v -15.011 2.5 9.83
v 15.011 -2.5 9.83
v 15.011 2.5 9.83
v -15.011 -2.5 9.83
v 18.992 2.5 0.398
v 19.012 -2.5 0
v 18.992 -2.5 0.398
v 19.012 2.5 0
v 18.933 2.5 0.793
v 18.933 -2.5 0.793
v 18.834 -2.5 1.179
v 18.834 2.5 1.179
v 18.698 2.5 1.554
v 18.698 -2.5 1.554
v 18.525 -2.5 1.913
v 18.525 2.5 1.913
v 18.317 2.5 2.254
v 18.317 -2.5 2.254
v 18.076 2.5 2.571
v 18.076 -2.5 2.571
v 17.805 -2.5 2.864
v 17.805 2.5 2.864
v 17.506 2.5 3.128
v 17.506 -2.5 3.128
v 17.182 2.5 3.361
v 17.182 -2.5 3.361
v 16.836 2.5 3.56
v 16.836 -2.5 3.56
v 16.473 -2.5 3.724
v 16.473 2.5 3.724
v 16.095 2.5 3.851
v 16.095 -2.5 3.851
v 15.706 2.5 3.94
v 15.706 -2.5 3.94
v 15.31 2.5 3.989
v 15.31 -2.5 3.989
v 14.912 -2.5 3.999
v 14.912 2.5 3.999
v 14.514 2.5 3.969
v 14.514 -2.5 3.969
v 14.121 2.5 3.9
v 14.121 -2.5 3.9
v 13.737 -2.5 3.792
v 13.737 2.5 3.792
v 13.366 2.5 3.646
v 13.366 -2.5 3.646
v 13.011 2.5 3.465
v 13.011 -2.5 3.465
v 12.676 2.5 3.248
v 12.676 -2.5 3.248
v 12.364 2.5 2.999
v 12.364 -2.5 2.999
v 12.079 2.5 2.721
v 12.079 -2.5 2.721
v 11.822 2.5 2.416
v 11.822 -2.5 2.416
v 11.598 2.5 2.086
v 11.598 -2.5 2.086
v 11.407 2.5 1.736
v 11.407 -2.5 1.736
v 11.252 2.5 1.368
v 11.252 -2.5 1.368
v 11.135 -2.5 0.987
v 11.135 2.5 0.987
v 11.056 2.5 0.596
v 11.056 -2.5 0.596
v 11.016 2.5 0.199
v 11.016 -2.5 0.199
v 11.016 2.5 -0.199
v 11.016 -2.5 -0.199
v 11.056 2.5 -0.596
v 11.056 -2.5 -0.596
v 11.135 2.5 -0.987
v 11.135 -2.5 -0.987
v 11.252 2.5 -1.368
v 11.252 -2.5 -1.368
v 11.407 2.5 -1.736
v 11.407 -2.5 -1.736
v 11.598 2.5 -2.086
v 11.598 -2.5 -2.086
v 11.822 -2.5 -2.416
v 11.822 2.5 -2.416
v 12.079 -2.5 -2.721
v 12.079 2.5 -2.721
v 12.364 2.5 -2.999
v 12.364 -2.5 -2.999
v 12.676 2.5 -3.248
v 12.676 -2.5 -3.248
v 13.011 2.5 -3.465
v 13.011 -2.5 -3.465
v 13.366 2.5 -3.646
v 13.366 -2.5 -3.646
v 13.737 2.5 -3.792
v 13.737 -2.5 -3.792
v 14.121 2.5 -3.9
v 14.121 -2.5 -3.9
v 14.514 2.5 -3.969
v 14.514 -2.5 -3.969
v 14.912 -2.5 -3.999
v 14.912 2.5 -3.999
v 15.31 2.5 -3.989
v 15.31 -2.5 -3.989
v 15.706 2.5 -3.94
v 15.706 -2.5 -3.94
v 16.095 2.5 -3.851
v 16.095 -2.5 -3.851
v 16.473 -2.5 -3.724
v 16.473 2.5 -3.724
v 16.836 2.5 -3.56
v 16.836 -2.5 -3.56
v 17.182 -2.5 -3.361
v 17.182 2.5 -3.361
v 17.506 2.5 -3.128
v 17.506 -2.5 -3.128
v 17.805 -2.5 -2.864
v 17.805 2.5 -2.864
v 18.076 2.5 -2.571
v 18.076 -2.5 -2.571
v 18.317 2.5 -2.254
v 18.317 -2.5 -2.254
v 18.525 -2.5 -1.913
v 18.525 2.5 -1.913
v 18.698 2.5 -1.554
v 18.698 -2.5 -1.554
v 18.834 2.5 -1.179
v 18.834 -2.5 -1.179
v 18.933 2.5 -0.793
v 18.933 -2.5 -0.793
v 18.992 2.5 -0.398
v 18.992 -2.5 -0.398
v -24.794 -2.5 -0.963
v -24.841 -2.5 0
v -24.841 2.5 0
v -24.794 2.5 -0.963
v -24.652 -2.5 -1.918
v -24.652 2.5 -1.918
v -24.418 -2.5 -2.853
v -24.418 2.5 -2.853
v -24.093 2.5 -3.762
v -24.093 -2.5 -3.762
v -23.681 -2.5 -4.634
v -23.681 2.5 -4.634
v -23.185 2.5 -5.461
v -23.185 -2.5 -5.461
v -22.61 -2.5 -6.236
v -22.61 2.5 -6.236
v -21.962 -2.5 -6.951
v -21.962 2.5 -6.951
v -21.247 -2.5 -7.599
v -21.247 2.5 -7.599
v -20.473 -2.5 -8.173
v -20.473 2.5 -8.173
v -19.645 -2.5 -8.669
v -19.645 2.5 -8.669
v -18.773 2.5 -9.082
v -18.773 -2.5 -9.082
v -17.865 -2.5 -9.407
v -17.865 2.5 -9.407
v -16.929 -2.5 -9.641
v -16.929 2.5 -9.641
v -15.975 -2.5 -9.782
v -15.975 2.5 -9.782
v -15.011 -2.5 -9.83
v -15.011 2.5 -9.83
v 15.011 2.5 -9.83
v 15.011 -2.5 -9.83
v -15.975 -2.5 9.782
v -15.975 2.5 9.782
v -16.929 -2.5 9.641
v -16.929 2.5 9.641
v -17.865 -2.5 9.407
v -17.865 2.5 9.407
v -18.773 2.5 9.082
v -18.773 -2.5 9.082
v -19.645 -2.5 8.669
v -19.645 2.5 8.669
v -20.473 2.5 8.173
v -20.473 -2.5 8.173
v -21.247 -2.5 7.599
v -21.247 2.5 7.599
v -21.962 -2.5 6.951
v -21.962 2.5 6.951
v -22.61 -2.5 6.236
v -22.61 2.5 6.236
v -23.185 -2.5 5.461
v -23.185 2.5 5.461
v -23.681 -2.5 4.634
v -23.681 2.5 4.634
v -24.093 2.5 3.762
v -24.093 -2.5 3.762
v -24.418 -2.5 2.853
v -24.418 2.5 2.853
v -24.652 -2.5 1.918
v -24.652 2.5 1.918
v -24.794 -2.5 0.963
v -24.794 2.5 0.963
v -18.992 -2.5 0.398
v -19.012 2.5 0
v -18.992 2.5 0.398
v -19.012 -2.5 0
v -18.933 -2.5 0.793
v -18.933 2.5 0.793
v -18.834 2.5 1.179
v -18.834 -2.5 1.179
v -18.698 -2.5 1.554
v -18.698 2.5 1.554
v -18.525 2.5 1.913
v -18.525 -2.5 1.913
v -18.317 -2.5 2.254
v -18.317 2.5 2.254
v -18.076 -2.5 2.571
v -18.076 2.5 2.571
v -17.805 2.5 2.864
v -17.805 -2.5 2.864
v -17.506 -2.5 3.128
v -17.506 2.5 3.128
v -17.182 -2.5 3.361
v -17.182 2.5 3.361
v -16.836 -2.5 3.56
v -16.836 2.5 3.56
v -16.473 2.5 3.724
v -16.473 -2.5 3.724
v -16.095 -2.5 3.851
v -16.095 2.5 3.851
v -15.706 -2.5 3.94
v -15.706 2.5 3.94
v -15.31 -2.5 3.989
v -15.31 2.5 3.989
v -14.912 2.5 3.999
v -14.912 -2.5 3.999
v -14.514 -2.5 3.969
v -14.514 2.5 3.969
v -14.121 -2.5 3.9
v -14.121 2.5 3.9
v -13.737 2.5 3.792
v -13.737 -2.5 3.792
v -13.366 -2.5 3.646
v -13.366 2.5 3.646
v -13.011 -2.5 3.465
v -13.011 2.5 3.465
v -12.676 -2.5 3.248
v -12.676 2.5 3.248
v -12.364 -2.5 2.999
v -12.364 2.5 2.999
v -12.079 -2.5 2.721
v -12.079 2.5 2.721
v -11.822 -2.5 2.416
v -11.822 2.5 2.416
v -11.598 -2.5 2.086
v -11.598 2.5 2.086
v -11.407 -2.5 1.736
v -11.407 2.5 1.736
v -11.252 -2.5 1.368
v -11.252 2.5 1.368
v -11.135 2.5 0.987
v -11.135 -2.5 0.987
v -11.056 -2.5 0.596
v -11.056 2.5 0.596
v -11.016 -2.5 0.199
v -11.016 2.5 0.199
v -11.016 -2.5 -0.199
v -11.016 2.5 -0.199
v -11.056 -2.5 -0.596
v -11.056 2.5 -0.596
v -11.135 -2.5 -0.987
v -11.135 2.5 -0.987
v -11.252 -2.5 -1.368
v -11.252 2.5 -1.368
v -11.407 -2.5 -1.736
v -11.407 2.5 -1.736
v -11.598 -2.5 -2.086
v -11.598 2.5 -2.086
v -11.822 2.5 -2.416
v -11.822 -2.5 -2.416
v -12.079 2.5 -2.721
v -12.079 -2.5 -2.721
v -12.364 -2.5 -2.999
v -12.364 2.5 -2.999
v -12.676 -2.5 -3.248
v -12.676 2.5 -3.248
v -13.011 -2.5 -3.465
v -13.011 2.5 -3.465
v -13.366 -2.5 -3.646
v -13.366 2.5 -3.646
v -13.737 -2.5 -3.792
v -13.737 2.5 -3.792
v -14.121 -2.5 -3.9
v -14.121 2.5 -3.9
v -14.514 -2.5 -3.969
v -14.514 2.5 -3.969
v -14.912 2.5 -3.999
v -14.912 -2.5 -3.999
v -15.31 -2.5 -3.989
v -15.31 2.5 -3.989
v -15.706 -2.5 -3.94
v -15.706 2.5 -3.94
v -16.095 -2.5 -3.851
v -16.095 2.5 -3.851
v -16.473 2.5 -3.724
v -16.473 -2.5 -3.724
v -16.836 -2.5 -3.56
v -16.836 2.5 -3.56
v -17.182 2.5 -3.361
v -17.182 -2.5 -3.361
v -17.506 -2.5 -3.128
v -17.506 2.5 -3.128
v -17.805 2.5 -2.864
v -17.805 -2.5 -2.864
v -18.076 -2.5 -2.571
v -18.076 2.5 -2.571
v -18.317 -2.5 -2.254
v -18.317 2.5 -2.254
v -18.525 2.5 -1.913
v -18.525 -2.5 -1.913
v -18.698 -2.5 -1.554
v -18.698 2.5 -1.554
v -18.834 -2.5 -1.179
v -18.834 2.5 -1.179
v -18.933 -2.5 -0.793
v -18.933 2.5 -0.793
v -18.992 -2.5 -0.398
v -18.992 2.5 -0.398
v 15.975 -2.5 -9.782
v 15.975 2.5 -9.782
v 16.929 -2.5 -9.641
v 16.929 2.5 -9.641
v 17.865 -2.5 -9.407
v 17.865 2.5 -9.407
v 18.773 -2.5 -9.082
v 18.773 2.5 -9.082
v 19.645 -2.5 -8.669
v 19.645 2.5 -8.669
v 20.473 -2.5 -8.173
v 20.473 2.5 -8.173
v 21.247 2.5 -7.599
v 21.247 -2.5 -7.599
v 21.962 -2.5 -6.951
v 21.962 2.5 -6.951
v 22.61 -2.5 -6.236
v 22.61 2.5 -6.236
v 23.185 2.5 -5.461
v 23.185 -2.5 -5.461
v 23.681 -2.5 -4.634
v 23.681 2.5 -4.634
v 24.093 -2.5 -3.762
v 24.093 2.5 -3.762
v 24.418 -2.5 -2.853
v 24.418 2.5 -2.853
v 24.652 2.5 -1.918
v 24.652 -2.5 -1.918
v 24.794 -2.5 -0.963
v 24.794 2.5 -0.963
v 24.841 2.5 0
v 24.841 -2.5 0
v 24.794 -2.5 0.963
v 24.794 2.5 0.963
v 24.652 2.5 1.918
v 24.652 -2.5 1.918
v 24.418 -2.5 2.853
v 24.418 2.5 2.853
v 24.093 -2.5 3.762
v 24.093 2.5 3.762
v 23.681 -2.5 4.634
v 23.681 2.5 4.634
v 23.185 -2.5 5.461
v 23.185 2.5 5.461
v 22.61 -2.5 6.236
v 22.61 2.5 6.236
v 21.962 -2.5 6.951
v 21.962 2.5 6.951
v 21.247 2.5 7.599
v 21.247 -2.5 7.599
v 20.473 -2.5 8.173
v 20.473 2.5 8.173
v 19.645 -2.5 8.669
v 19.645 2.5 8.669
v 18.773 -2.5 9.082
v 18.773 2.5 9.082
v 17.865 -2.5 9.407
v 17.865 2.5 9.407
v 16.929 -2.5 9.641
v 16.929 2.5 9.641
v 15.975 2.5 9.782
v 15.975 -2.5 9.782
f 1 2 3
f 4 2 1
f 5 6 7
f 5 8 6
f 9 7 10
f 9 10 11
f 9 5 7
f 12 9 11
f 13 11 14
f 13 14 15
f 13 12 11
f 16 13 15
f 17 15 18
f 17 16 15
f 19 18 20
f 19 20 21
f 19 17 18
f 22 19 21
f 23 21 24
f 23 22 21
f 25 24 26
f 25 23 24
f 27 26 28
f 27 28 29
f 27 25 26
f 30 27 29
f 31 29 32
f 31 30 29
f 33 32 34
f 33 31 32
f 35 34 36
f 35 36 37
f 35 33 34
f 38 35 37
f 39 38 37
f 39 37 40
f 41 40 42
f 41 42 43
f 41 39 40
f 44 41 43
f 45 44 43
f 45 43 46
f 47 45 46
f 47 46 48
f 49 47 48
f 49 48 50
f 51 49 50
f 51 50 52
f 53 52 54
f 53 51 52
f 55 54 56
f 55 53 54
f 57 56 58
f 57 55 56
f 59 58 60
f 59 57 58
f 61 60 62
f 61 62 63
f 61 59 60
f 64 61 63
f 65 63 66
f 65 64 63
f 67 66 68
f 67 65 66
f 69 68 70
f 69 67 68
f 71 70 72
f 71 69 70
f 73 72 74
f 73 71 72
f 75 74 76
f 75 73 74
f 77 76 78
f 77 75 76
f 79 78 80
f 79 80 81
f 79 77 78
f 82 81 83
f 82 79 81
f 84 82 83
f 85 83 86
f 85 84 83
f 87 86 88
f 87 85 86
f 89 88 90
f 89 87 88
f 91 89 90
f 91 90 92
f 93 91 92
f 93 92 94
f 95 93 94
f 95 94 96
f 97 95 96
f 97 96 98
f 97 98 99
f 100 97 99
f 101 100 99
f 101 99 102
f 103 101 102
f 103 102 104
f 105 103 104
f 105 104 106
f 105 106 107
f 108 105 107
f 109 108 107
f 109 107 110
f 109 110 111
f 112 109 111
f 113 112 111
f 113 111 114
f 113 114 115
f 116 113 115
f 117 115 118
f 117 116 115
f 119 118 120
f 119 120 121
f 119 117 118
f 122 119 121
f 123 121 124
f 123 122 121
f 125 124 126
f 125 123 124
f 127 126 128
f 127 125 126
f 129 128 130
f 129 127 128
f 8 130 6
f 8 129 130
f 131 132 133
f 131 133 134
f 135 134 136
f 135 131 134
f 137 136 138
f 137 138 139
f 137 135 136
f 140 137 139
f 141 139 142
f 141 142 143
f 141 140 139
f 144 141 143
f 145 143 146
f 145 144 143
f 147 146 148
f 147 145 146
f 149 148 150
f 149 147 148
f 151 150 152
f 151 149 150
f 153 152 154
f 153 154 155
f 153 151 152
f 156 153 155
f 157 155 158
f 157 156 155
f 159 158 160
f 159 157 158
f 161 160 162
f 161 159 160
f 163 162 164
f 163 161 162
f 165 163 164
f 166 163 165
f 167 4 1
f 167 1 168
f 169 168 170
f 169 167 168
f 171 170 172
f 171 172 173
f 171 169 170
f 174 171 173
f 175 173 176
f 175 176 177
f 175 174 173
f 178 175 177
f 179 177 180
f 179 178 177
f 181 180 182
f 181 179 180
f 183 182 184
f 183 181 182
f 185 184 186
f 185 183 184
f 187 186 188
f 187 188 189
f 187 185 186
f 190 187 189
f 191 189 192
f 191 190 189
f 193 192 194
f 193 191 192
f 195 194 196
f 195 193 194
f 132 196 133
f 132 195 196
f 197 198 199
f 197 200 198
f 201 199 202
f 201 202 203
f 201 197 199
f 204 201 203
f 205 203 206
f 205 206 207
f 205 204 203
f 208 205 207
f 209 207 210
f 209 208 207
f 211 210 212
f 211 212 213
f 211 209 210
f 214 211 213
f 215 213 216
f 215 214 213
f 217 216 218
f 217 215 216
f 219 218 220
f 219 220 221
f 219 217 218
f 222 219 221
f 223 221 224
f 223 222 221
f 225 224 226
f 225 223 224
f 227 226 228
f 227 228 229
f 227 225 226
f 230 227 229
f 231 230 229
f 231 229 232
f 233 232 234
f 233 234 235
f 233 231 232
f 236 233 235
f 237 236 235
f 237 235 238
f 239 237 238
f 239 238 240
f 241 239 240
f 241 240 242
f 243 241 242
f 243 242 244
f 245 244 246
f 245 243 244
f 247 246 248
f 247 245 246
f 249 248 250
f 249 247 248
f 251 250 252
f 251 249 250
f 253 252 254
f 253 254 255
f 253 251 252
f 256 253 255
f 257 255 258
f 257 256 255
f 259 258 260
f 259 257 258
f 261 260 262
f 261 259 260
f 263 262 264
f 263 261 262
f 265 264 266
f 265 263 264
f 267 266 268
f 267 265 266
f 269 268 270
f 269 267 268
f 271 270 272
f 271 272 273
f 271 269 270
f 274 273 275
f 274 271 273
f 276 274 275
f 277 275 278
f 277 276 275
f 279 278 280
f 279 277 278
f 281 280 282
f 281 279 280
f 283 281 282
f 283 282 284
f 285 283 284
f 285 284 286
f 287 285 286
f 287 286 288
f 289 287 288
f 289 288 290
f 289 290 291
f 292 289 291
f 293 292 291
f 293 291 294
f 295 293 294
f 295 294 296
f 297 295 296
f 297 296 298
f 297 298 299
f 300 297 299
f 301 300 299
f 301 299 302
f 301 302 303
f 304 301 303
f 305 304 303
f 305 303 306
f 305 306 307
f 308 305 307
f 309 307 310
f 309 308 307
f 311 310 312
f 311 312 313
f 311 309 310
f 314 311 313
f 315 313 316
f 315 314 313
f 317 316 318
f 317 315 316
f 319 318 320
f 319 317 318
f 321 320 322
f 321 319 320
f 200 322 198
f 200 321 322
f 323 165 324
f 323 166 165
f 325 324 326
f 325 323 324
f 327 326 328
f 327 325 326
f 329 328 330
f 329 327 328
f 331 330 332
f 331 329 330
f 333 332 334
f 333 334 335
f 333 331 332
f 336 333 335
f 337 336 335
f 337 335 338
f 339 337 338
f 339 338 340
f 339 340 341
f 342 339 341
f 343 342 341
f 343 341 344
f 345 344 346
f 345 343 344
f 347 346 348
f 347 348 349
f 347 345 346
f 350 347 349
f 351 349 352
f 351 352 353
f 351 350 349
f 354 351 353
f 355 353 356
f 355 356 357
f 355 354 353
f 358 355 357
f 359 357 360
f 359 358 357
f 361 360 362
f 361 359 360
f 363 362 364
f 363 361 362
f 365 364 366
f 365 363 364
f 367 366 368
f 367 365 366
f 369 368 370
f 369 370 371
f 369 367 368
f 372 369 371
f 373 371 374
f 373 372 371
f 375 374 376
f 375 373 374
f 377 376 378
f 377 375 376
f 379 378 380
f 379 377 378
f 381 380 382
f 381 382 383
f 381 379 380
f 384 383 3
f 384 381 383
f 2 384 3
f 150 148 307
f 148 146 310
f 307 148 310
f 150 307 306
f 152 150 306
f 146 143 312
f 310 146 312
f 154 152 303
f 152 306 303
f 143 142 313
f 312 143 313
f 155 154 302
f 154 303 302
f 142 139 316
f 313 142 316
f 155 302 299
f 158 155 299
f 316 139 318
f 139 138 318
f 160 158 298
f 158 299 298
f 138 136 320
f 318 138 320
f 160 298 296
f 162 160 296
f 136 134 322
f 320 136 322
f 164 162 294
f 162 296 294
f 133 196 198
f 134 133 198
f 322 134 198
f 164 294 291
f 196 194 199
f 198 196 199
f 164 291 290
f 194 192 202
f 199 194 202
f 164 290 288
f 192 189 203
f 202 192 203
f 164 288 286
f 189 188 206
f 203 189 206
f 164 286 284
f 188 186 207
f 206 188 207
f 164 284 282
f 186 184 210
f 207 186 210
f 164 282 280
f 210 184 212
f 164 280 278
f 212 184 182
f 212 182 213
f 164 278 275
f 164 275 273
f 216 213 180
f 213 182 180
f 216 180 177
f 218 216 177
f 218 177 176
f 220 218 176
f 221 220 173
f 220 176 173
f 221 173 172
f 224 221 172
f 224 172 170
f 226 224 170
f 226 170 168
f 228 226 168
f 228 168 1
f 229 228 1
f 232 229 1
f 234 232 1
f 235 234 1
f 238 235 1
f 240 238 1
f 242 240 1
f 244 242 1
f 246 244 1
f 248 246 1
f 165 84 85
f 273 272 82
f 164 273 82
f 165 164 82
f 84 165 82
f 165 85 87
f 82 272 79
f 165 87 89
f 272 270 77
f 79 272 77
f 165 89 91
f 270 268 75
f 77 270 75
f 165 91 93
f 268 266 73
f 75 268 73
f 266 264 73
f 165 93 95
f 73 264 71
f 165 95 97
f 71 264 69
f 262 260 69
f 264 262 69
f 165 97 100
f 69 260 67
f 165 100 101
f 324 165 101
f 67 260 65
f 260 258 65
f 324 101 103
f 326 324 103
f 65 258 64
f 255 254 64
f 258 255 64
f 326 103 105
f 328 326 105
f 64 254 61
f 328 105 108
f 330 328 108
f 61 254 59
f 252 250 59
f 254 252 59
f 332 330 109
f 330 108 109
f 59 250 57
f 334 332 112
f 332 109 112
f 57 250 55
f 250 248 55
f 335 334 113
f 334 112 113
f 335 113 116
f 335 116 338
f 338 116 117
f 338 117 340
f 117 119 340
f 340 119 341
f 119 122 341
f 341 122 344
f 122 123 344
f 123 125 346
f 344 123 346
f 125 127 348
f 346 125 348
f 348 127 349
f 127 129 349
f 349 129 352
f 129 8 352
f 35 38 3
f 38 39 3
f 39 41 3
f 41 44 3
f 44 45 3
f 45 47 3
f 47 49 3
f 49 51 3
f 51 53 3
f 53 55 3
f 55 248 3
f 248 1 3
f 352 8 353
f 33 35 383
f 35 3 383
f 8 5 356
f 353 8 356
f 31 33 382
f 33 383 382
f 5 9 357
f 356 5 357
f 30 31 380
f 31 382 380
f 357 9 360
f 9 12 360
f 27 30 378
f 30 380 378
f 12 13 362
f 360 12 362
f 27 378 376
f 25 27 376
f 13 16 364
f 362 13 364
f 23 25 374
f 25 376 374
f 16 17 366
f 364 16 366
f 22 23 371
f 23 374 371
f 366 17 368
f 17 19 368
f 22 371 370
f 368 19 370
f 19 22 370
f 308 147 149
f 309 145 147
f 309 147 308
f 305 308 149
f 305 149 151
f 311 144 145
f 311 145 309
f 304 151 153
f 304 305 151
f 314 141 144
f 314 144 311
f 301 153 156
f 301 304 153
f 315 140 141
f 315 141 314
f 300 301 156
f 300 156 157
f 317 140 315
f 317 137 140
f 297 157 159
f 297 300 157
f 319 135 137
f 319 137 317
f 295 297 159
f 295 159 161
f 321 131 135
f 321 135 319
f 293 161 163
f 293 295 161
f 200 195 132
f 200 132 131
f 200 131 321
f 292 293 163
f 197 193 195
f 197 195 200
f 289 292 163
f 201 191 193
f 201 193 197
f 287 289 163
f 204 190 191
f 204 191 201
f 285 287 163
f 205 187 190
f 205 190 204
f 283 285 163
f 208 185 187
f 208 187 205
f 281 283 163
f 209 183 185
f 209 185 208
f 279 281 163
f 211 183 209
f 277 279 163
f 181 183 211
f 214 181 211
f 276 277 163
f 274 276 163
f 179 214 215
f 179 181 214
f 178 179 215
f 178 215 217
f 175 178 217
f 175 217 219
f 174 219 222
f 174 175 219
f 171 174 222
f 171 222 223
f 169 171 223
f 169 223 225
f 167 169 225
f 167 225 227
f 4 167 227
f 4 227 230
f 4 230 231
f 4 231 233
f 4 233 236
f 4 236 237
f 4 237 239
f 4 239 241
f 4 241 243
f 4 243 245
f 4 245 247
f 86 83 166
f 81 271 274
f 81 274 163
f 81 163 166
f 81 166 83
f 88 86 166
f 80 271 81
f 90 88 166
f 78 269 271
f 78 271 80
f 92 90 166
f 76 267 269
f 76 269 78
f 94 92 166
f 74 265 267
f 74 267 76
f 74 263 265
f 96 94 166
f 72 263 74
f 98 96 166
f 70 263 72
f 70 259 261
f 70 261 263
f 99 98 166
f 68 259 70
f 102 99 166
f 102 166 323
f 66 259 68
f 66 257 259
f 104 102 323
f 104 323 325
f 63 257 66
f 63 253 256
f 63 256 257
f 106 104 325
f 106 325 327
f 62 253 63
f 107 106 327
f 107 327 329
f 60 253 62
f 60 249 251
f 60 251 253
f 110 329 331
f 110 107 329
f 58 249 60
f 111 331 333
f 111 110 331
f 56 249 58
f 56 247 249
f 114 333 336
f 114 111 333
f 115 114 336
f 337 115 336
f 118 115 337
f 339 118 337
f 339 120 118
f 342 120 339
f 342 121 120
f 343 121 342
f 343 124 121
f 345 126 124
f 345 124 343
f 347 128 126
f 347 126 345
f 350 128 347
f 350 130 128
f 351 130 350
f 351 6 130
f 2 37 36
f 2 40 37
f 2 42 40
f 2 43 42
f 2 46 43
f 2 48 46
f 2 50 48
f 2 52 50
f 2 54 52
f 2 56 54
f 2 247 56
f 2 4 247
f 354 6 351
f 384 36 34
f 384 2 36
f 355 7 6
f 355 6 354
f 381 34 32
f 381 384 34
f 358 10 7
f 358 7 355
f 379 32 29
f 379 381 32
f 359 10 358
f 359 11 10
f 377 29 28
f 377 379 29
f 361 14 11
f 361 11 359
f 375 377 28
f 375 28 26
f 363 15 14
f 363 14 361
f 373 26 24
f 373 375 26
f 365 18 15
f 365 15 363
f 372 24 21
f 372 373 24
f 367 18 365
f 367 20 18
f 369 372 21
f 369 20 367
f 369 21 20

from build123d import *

# Parameters (mm, degrees)
F0_R     = 4.0005
F1_DEPTH = 2.5


with BuildPart() as f1:
    # F0 (on Front) → F1 (new body, symmetric)
    with BuildSketch(Plane.XZ):
        with BuildLine():
            Line((0, 9.8298), (0, 0))
            Line((0, 0), (-11.0109, 0))
            ThreePointArc((-11.0109, 0), (-15.0114, -4.0005), (-19.0119, 0))
            Line((-19.0119, 0), (-24.8412, 0))
            ThreePointArc((-24.8412, 0), (-21.962118, -6.950718), (-15.0114, -9.8298))
            Line((-15.0114, -9.8298), (0, -9.8298))
            Line((0, -9.8298), (15.0114, -9.8298))
            ThreePointArc((15.0114, -9.8298), (24.8412, 0), (15.0114, 9.8298))
            Line((15.0114, 9.8298), (0, 9.8298))
        make_face()
        with Locations((15.0114, 0)):
            Circle(F0_R, mode=Mode.SUBTRACT)
        with BuildLine():
            Line((-11.0109, 0), (0, 0))
            Line((0, 0), (0, 9.8298))
            Line((0, 9.8298), (-15.0114, 9.8298))
            ThreePointArc((-15.0114, 9.8298), (-21.962118, 6.950718), (-24.8412, 0))
            Line((-24.8412, 0), (-19.0119, 0))
            ThreePointArc((-19.0119, 0), (-15.0114, 4.0005), (-11.0109, 0))
        make_face()
    extrude(amount=F1_DEPTH, both=True)


solid = f1.part
